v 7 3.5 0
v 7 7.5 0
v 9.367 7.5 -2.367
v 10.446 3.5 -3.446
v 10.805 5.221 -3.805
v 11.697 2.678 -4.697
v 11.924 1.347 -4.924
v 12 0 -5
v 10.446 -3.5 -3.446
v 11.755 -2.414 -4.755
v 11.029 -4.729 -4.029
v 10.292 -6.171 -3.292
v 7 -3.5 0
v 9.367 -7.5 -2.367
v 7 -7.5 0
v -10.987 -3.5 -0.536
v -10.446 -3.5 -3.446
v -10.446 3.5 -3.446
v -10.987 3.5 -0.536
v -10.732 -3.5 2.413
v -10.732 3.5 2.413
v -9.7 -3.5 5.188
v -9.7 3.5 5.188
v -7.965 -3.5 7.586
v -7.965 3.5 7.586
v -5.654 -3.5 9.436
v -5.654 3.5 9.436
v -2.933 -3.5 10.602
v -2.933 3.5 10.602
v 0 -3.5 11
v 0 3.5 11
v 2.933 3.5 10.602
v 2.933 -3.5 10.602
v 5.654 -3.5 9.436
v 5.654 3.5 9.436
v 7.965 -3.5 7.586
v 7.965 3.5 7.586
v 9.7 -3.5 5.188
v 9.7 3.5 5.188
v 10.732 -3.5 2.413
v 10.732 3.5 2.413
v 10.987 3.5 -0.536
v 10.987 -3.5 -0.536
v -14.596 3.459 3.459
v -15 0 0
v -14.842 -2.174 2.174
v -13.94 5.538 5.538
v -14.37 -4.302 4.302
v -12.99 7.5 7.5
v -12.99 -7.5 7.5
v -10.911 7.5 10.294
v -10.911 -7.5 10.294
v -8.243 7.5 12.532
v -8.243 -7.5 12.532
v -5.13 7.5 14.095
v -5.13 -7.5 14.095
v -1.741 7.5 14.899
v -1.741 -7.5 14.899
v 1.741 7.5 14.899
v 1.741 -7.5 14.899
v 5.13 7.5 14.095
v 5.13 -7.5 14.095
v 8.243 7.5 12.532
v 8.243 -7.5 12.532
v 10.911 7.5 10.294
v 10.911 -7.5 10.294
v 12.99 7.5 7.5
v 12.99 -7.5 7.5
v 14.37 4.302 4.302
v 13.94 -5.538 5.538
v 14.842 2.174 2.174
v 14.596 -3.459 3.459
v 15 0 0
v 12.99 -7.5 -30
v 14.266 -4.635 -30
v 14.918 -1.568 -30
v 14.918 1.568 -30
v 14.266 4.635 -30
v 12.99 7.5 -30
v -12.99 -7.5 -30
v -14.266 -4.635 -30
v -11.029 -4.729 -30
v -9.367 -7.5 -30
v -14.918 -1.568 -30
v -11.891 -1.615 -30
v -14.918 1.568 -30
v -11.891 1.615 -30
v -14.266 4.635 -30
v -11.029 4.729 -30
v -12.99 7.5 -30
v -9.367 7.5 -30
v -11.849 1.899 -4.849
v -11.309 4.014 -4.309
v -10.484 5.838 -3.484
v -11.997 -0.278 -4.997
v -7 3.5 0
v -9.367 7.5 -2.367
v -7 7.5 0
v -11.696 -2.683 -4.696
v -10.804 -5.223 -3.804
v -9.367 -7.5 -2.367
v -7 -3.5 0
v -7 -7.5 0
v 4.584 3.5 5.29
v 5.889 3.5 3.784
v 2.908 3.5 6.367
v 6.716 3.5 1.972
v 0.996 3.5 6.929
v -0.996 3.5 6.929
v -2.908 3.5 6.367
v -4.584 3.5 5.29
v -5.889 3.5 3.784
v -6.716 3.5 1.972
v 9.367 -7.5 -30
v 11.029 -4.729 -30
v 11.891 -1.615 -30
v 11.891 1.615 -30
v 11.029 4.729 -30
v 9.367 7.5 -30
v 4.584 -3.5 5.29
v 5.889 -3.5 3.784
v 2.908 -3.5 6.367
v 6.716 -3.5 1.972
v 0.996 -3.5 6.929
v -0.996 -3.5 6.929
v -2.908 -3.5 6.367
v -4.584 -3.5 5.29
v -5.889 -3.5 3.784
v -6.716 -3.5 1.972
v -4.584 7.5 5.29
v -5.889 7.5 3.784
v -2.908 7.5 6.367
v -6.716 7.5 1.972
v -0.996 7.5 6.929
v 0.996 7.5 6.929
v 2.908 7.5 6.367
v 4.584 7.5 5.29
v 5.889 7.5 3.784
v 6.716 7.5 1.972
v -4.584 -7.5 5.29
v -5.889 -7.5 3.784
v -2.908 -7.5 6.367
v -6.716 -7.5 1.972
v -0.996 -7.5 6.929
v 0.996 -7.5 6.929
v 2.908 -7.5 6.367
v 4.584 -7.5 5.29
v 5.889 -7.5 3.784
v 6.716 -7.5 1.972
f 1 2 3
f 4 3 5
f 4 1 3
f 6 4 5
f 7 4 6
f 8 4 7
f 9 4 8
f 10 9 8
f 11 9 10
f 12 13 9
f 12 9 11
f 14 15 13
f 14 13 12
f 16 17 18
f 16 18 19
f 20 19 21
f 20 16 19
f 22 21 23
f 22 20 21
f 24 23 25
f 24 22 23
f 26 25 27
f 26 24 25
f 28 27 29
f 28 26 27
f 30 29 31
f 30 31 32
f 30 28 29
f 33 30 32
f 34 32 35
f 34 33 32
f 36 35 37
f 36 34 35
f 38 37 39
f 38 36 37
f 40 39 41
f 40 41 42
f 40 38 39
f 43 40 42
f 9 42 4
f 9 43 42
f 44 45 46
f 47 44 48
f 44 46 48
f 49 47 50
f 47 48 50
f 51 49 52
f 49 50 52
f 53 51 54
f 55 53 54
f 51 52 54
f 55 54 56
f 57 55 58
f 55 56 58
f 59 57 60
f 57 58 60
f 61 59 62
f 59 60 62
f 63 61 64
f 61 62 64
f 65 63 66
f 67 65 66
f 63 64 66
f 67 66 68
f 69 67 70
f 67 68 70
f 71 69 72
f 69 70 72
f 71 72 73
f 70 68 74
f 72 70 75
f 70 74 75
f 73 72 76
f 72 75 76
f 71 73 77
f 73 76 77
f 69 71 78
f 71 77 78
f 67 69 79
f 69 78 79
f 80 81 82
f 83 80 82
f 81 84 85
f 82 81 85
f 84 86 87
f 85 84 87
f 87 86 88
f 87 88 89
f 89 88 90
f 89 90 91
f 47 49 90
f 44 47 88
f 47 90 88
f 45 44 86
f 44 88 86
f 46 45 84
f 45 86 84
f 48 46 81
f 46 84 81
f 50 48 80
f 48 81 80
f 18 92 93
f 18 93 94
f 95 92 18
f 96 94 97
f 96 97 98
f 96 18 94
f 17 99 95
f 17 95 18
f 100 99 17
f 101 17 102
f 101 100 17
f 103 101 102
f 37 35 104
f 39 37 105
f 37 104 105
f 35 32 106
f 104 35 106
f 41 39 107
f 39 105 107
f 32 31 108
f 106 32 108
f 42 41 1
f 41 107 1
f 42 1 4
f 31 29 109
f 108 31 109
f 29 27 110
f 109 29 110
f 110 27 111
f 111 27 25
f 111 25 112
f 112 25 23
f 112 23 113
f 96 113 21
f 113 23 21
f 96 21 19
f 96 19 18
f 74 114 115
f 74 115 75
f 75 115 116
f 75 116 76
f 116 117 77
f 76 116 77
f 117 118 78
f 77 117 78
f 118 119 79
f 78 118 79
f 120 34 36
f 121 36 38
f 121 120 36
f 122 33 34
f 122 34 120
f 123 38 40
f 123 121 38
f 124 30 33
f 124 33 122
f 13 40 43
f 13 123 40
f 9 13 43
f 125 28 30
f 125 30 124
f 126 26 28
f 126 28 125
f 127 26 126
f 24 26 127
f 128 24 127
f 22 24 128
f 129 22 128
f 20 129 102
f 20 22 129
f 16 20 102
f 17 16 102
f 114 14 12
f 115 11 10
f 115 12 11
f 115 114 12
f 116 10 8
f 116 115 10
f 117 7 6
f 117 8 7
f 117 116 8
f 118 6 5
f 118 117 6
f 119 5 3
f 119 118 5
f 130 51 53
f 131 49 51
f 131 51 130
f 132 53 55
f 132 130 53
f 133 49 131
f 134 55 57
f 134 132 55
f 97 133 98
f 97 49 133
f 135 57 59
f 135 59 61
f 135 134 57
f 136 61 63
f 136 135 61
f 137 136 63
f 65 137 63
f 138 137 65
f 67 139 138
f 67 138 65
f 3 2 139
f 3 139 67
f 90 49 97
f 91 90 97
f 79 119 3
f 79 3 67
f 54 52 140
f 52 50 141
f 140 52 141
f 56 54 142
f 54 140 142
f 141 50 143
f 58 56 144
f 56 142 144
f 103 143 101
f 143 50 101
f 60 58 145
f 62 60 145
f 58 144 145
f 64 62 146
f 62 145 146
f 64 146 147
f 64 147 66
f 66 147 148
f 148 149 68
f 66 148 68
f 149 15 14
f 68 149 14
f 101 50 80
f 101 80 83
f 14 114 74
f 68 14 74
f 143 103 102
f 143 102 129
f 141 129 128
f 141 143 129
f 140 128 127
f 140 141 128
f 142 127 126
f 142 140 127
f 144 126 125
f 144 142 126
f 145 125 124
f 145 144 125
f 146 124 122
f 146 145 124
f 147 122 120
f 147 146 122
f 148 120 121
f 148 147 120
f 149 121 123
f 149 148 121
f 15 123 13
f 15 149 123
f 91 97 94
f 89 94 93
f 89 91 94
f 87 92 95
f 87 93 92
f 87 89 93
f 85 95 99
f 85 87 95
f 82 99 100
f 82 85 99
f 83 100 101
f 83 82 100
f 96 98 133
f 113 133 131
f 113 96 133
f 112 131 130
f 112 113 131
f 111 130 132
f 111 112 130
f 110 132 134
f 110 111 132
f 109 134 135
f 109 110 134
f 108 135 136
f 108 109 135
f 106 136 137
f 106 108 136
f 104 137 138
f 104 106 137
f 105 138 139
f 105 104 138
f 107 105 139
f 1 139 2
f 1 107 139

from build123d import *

# Parameters (mm, degrees)
CYLINDER002_R          = 7
CYLINDER002_DEPTH      = 15
CYLINDER002_ROLL_ANGLE = -90
PAD_DEPTH              = 15
CYLINDER003_R          = 12
CYLINDER003_DEPTH      = 30
CYLINDER_R             = 11
CYLINDER_DEPTH         = 7
BOX_W                  = 30
BOX_H                  = 15
BOX_DEPTH              = 30
CYLINDER001_R          = 15
CYLINDER001_DEPTH      = 15
CYLINDER001_ROLL_ANGLE = -90
CYLINDER004_R          = 15
CYLINDER004_DEPTH      = 45


with BuildPart() as cylinder001:
    # Cylinder002 → Cylinder002 (new body)
    with BuildSketch(Plane.XY):
        Circle(CYLINDER002_R)
    extrude(amount=CYLINDER002_DEPTH)


with BuildPart() as cylinder001_1:
    # Cylinder002 roll: moved
    add(cylinder001.part.rotate(Axis((0, 0, 0), (1, 0, 0)), CYLINDER002_ROLL_ANGLE))


with BuildPart() as cylinder001_2:
    # Cylinder002 placement: moved
    add(cylinder001_1.part.moved(Location((0, -7.5, 0))))


with BuildPart() as body:
    # Sketch → Pad (new body)
    with BuildSketch(Plane.XZ):
        Polygon((-7, 0), (7, 0), (15, -8), (15, -30), (-15, -30), (-15, -8), align=None)
    extrude(amount=-PAD_DEPTH)


with BuildPart() as body_1:
    # Body placement: moved
    add(body.part.moved(Location((0, -7.5, 0))))


with BuildPart() as common:
    # Cylinder003 → Cylinder003 (new body)
    with BuildSketch(Plane.XY.offset(-30)):
        Circle(CYLINDER003_R)
    extrude(amount=CYLINDER003_DEPTH)

    # Common: intersect Body
    add(body_1.part, mode=Mode.INTERSECT)


with BuildPart() as negative_fusion:
    # Cylinder → Cylinder (new body)
    with BuildSketch(Plane(origin=(0, -3.5, 0), x_dir=(0, 0, -1), z_dir=(0, 1, 0))):
        Circle(CYLINDER_R)
    extrude(amount=CYLINDER_DEPTH)

    # Fusion: union Cylinder001, Common
    add(cylinder001_2.part)
    add(common.part)


with BuildPart() as cube:
    # Box → Box (new body)
    with BuildSketch(Plane(origin=(-15, -7.5, -30), x_dir=(1, 0, 0), z_dir=(0, 0, 1))):
        with Locations((15, 7.5)):
            Rectangle(BOX_W, BOX_H)
    extrude(amount=BOX_DEPTH)


with BuildPart() as cut:
    # Cylinder001 → Cylinder001 (new body)
    with BuildSketch(Plane.XY):
        Circle(CYLINDER001_R)
    extrude(amount=CYLINDER001_DEPTH)


with BuildPart() as cut_1:
    # Cylinder001 roll: moved
    add(cut.part.rotate(Axis((0, 0, 0), (1, 0, 0)), CYLINDER001_ROLL_ANGLE))


with BuildPart() as cut_2:
    # Cylinder001 placement: moved
    add(cut_1.part.moved(Location((0, -7.5, 0))))

    # Fusion001: union Cube
    add(cube.part)

    # Cut: cut Negative Fusion
    add(negative_fusion.part, mode=Mode.SUBTRACT)


with BuildPart() as common001:
    # Cylinder004 → Cylinder004 (new body)
    with BuildSketch(Plane.XY.offset(-30)):
        Circle(CYLINDER004_R)
    extrude(amount=CYLINDER004_DEPTH)

    # Common001: intersect Cut
    add(cut_2.part, mode=Mode.INTERSECT)


solid = common001.part
